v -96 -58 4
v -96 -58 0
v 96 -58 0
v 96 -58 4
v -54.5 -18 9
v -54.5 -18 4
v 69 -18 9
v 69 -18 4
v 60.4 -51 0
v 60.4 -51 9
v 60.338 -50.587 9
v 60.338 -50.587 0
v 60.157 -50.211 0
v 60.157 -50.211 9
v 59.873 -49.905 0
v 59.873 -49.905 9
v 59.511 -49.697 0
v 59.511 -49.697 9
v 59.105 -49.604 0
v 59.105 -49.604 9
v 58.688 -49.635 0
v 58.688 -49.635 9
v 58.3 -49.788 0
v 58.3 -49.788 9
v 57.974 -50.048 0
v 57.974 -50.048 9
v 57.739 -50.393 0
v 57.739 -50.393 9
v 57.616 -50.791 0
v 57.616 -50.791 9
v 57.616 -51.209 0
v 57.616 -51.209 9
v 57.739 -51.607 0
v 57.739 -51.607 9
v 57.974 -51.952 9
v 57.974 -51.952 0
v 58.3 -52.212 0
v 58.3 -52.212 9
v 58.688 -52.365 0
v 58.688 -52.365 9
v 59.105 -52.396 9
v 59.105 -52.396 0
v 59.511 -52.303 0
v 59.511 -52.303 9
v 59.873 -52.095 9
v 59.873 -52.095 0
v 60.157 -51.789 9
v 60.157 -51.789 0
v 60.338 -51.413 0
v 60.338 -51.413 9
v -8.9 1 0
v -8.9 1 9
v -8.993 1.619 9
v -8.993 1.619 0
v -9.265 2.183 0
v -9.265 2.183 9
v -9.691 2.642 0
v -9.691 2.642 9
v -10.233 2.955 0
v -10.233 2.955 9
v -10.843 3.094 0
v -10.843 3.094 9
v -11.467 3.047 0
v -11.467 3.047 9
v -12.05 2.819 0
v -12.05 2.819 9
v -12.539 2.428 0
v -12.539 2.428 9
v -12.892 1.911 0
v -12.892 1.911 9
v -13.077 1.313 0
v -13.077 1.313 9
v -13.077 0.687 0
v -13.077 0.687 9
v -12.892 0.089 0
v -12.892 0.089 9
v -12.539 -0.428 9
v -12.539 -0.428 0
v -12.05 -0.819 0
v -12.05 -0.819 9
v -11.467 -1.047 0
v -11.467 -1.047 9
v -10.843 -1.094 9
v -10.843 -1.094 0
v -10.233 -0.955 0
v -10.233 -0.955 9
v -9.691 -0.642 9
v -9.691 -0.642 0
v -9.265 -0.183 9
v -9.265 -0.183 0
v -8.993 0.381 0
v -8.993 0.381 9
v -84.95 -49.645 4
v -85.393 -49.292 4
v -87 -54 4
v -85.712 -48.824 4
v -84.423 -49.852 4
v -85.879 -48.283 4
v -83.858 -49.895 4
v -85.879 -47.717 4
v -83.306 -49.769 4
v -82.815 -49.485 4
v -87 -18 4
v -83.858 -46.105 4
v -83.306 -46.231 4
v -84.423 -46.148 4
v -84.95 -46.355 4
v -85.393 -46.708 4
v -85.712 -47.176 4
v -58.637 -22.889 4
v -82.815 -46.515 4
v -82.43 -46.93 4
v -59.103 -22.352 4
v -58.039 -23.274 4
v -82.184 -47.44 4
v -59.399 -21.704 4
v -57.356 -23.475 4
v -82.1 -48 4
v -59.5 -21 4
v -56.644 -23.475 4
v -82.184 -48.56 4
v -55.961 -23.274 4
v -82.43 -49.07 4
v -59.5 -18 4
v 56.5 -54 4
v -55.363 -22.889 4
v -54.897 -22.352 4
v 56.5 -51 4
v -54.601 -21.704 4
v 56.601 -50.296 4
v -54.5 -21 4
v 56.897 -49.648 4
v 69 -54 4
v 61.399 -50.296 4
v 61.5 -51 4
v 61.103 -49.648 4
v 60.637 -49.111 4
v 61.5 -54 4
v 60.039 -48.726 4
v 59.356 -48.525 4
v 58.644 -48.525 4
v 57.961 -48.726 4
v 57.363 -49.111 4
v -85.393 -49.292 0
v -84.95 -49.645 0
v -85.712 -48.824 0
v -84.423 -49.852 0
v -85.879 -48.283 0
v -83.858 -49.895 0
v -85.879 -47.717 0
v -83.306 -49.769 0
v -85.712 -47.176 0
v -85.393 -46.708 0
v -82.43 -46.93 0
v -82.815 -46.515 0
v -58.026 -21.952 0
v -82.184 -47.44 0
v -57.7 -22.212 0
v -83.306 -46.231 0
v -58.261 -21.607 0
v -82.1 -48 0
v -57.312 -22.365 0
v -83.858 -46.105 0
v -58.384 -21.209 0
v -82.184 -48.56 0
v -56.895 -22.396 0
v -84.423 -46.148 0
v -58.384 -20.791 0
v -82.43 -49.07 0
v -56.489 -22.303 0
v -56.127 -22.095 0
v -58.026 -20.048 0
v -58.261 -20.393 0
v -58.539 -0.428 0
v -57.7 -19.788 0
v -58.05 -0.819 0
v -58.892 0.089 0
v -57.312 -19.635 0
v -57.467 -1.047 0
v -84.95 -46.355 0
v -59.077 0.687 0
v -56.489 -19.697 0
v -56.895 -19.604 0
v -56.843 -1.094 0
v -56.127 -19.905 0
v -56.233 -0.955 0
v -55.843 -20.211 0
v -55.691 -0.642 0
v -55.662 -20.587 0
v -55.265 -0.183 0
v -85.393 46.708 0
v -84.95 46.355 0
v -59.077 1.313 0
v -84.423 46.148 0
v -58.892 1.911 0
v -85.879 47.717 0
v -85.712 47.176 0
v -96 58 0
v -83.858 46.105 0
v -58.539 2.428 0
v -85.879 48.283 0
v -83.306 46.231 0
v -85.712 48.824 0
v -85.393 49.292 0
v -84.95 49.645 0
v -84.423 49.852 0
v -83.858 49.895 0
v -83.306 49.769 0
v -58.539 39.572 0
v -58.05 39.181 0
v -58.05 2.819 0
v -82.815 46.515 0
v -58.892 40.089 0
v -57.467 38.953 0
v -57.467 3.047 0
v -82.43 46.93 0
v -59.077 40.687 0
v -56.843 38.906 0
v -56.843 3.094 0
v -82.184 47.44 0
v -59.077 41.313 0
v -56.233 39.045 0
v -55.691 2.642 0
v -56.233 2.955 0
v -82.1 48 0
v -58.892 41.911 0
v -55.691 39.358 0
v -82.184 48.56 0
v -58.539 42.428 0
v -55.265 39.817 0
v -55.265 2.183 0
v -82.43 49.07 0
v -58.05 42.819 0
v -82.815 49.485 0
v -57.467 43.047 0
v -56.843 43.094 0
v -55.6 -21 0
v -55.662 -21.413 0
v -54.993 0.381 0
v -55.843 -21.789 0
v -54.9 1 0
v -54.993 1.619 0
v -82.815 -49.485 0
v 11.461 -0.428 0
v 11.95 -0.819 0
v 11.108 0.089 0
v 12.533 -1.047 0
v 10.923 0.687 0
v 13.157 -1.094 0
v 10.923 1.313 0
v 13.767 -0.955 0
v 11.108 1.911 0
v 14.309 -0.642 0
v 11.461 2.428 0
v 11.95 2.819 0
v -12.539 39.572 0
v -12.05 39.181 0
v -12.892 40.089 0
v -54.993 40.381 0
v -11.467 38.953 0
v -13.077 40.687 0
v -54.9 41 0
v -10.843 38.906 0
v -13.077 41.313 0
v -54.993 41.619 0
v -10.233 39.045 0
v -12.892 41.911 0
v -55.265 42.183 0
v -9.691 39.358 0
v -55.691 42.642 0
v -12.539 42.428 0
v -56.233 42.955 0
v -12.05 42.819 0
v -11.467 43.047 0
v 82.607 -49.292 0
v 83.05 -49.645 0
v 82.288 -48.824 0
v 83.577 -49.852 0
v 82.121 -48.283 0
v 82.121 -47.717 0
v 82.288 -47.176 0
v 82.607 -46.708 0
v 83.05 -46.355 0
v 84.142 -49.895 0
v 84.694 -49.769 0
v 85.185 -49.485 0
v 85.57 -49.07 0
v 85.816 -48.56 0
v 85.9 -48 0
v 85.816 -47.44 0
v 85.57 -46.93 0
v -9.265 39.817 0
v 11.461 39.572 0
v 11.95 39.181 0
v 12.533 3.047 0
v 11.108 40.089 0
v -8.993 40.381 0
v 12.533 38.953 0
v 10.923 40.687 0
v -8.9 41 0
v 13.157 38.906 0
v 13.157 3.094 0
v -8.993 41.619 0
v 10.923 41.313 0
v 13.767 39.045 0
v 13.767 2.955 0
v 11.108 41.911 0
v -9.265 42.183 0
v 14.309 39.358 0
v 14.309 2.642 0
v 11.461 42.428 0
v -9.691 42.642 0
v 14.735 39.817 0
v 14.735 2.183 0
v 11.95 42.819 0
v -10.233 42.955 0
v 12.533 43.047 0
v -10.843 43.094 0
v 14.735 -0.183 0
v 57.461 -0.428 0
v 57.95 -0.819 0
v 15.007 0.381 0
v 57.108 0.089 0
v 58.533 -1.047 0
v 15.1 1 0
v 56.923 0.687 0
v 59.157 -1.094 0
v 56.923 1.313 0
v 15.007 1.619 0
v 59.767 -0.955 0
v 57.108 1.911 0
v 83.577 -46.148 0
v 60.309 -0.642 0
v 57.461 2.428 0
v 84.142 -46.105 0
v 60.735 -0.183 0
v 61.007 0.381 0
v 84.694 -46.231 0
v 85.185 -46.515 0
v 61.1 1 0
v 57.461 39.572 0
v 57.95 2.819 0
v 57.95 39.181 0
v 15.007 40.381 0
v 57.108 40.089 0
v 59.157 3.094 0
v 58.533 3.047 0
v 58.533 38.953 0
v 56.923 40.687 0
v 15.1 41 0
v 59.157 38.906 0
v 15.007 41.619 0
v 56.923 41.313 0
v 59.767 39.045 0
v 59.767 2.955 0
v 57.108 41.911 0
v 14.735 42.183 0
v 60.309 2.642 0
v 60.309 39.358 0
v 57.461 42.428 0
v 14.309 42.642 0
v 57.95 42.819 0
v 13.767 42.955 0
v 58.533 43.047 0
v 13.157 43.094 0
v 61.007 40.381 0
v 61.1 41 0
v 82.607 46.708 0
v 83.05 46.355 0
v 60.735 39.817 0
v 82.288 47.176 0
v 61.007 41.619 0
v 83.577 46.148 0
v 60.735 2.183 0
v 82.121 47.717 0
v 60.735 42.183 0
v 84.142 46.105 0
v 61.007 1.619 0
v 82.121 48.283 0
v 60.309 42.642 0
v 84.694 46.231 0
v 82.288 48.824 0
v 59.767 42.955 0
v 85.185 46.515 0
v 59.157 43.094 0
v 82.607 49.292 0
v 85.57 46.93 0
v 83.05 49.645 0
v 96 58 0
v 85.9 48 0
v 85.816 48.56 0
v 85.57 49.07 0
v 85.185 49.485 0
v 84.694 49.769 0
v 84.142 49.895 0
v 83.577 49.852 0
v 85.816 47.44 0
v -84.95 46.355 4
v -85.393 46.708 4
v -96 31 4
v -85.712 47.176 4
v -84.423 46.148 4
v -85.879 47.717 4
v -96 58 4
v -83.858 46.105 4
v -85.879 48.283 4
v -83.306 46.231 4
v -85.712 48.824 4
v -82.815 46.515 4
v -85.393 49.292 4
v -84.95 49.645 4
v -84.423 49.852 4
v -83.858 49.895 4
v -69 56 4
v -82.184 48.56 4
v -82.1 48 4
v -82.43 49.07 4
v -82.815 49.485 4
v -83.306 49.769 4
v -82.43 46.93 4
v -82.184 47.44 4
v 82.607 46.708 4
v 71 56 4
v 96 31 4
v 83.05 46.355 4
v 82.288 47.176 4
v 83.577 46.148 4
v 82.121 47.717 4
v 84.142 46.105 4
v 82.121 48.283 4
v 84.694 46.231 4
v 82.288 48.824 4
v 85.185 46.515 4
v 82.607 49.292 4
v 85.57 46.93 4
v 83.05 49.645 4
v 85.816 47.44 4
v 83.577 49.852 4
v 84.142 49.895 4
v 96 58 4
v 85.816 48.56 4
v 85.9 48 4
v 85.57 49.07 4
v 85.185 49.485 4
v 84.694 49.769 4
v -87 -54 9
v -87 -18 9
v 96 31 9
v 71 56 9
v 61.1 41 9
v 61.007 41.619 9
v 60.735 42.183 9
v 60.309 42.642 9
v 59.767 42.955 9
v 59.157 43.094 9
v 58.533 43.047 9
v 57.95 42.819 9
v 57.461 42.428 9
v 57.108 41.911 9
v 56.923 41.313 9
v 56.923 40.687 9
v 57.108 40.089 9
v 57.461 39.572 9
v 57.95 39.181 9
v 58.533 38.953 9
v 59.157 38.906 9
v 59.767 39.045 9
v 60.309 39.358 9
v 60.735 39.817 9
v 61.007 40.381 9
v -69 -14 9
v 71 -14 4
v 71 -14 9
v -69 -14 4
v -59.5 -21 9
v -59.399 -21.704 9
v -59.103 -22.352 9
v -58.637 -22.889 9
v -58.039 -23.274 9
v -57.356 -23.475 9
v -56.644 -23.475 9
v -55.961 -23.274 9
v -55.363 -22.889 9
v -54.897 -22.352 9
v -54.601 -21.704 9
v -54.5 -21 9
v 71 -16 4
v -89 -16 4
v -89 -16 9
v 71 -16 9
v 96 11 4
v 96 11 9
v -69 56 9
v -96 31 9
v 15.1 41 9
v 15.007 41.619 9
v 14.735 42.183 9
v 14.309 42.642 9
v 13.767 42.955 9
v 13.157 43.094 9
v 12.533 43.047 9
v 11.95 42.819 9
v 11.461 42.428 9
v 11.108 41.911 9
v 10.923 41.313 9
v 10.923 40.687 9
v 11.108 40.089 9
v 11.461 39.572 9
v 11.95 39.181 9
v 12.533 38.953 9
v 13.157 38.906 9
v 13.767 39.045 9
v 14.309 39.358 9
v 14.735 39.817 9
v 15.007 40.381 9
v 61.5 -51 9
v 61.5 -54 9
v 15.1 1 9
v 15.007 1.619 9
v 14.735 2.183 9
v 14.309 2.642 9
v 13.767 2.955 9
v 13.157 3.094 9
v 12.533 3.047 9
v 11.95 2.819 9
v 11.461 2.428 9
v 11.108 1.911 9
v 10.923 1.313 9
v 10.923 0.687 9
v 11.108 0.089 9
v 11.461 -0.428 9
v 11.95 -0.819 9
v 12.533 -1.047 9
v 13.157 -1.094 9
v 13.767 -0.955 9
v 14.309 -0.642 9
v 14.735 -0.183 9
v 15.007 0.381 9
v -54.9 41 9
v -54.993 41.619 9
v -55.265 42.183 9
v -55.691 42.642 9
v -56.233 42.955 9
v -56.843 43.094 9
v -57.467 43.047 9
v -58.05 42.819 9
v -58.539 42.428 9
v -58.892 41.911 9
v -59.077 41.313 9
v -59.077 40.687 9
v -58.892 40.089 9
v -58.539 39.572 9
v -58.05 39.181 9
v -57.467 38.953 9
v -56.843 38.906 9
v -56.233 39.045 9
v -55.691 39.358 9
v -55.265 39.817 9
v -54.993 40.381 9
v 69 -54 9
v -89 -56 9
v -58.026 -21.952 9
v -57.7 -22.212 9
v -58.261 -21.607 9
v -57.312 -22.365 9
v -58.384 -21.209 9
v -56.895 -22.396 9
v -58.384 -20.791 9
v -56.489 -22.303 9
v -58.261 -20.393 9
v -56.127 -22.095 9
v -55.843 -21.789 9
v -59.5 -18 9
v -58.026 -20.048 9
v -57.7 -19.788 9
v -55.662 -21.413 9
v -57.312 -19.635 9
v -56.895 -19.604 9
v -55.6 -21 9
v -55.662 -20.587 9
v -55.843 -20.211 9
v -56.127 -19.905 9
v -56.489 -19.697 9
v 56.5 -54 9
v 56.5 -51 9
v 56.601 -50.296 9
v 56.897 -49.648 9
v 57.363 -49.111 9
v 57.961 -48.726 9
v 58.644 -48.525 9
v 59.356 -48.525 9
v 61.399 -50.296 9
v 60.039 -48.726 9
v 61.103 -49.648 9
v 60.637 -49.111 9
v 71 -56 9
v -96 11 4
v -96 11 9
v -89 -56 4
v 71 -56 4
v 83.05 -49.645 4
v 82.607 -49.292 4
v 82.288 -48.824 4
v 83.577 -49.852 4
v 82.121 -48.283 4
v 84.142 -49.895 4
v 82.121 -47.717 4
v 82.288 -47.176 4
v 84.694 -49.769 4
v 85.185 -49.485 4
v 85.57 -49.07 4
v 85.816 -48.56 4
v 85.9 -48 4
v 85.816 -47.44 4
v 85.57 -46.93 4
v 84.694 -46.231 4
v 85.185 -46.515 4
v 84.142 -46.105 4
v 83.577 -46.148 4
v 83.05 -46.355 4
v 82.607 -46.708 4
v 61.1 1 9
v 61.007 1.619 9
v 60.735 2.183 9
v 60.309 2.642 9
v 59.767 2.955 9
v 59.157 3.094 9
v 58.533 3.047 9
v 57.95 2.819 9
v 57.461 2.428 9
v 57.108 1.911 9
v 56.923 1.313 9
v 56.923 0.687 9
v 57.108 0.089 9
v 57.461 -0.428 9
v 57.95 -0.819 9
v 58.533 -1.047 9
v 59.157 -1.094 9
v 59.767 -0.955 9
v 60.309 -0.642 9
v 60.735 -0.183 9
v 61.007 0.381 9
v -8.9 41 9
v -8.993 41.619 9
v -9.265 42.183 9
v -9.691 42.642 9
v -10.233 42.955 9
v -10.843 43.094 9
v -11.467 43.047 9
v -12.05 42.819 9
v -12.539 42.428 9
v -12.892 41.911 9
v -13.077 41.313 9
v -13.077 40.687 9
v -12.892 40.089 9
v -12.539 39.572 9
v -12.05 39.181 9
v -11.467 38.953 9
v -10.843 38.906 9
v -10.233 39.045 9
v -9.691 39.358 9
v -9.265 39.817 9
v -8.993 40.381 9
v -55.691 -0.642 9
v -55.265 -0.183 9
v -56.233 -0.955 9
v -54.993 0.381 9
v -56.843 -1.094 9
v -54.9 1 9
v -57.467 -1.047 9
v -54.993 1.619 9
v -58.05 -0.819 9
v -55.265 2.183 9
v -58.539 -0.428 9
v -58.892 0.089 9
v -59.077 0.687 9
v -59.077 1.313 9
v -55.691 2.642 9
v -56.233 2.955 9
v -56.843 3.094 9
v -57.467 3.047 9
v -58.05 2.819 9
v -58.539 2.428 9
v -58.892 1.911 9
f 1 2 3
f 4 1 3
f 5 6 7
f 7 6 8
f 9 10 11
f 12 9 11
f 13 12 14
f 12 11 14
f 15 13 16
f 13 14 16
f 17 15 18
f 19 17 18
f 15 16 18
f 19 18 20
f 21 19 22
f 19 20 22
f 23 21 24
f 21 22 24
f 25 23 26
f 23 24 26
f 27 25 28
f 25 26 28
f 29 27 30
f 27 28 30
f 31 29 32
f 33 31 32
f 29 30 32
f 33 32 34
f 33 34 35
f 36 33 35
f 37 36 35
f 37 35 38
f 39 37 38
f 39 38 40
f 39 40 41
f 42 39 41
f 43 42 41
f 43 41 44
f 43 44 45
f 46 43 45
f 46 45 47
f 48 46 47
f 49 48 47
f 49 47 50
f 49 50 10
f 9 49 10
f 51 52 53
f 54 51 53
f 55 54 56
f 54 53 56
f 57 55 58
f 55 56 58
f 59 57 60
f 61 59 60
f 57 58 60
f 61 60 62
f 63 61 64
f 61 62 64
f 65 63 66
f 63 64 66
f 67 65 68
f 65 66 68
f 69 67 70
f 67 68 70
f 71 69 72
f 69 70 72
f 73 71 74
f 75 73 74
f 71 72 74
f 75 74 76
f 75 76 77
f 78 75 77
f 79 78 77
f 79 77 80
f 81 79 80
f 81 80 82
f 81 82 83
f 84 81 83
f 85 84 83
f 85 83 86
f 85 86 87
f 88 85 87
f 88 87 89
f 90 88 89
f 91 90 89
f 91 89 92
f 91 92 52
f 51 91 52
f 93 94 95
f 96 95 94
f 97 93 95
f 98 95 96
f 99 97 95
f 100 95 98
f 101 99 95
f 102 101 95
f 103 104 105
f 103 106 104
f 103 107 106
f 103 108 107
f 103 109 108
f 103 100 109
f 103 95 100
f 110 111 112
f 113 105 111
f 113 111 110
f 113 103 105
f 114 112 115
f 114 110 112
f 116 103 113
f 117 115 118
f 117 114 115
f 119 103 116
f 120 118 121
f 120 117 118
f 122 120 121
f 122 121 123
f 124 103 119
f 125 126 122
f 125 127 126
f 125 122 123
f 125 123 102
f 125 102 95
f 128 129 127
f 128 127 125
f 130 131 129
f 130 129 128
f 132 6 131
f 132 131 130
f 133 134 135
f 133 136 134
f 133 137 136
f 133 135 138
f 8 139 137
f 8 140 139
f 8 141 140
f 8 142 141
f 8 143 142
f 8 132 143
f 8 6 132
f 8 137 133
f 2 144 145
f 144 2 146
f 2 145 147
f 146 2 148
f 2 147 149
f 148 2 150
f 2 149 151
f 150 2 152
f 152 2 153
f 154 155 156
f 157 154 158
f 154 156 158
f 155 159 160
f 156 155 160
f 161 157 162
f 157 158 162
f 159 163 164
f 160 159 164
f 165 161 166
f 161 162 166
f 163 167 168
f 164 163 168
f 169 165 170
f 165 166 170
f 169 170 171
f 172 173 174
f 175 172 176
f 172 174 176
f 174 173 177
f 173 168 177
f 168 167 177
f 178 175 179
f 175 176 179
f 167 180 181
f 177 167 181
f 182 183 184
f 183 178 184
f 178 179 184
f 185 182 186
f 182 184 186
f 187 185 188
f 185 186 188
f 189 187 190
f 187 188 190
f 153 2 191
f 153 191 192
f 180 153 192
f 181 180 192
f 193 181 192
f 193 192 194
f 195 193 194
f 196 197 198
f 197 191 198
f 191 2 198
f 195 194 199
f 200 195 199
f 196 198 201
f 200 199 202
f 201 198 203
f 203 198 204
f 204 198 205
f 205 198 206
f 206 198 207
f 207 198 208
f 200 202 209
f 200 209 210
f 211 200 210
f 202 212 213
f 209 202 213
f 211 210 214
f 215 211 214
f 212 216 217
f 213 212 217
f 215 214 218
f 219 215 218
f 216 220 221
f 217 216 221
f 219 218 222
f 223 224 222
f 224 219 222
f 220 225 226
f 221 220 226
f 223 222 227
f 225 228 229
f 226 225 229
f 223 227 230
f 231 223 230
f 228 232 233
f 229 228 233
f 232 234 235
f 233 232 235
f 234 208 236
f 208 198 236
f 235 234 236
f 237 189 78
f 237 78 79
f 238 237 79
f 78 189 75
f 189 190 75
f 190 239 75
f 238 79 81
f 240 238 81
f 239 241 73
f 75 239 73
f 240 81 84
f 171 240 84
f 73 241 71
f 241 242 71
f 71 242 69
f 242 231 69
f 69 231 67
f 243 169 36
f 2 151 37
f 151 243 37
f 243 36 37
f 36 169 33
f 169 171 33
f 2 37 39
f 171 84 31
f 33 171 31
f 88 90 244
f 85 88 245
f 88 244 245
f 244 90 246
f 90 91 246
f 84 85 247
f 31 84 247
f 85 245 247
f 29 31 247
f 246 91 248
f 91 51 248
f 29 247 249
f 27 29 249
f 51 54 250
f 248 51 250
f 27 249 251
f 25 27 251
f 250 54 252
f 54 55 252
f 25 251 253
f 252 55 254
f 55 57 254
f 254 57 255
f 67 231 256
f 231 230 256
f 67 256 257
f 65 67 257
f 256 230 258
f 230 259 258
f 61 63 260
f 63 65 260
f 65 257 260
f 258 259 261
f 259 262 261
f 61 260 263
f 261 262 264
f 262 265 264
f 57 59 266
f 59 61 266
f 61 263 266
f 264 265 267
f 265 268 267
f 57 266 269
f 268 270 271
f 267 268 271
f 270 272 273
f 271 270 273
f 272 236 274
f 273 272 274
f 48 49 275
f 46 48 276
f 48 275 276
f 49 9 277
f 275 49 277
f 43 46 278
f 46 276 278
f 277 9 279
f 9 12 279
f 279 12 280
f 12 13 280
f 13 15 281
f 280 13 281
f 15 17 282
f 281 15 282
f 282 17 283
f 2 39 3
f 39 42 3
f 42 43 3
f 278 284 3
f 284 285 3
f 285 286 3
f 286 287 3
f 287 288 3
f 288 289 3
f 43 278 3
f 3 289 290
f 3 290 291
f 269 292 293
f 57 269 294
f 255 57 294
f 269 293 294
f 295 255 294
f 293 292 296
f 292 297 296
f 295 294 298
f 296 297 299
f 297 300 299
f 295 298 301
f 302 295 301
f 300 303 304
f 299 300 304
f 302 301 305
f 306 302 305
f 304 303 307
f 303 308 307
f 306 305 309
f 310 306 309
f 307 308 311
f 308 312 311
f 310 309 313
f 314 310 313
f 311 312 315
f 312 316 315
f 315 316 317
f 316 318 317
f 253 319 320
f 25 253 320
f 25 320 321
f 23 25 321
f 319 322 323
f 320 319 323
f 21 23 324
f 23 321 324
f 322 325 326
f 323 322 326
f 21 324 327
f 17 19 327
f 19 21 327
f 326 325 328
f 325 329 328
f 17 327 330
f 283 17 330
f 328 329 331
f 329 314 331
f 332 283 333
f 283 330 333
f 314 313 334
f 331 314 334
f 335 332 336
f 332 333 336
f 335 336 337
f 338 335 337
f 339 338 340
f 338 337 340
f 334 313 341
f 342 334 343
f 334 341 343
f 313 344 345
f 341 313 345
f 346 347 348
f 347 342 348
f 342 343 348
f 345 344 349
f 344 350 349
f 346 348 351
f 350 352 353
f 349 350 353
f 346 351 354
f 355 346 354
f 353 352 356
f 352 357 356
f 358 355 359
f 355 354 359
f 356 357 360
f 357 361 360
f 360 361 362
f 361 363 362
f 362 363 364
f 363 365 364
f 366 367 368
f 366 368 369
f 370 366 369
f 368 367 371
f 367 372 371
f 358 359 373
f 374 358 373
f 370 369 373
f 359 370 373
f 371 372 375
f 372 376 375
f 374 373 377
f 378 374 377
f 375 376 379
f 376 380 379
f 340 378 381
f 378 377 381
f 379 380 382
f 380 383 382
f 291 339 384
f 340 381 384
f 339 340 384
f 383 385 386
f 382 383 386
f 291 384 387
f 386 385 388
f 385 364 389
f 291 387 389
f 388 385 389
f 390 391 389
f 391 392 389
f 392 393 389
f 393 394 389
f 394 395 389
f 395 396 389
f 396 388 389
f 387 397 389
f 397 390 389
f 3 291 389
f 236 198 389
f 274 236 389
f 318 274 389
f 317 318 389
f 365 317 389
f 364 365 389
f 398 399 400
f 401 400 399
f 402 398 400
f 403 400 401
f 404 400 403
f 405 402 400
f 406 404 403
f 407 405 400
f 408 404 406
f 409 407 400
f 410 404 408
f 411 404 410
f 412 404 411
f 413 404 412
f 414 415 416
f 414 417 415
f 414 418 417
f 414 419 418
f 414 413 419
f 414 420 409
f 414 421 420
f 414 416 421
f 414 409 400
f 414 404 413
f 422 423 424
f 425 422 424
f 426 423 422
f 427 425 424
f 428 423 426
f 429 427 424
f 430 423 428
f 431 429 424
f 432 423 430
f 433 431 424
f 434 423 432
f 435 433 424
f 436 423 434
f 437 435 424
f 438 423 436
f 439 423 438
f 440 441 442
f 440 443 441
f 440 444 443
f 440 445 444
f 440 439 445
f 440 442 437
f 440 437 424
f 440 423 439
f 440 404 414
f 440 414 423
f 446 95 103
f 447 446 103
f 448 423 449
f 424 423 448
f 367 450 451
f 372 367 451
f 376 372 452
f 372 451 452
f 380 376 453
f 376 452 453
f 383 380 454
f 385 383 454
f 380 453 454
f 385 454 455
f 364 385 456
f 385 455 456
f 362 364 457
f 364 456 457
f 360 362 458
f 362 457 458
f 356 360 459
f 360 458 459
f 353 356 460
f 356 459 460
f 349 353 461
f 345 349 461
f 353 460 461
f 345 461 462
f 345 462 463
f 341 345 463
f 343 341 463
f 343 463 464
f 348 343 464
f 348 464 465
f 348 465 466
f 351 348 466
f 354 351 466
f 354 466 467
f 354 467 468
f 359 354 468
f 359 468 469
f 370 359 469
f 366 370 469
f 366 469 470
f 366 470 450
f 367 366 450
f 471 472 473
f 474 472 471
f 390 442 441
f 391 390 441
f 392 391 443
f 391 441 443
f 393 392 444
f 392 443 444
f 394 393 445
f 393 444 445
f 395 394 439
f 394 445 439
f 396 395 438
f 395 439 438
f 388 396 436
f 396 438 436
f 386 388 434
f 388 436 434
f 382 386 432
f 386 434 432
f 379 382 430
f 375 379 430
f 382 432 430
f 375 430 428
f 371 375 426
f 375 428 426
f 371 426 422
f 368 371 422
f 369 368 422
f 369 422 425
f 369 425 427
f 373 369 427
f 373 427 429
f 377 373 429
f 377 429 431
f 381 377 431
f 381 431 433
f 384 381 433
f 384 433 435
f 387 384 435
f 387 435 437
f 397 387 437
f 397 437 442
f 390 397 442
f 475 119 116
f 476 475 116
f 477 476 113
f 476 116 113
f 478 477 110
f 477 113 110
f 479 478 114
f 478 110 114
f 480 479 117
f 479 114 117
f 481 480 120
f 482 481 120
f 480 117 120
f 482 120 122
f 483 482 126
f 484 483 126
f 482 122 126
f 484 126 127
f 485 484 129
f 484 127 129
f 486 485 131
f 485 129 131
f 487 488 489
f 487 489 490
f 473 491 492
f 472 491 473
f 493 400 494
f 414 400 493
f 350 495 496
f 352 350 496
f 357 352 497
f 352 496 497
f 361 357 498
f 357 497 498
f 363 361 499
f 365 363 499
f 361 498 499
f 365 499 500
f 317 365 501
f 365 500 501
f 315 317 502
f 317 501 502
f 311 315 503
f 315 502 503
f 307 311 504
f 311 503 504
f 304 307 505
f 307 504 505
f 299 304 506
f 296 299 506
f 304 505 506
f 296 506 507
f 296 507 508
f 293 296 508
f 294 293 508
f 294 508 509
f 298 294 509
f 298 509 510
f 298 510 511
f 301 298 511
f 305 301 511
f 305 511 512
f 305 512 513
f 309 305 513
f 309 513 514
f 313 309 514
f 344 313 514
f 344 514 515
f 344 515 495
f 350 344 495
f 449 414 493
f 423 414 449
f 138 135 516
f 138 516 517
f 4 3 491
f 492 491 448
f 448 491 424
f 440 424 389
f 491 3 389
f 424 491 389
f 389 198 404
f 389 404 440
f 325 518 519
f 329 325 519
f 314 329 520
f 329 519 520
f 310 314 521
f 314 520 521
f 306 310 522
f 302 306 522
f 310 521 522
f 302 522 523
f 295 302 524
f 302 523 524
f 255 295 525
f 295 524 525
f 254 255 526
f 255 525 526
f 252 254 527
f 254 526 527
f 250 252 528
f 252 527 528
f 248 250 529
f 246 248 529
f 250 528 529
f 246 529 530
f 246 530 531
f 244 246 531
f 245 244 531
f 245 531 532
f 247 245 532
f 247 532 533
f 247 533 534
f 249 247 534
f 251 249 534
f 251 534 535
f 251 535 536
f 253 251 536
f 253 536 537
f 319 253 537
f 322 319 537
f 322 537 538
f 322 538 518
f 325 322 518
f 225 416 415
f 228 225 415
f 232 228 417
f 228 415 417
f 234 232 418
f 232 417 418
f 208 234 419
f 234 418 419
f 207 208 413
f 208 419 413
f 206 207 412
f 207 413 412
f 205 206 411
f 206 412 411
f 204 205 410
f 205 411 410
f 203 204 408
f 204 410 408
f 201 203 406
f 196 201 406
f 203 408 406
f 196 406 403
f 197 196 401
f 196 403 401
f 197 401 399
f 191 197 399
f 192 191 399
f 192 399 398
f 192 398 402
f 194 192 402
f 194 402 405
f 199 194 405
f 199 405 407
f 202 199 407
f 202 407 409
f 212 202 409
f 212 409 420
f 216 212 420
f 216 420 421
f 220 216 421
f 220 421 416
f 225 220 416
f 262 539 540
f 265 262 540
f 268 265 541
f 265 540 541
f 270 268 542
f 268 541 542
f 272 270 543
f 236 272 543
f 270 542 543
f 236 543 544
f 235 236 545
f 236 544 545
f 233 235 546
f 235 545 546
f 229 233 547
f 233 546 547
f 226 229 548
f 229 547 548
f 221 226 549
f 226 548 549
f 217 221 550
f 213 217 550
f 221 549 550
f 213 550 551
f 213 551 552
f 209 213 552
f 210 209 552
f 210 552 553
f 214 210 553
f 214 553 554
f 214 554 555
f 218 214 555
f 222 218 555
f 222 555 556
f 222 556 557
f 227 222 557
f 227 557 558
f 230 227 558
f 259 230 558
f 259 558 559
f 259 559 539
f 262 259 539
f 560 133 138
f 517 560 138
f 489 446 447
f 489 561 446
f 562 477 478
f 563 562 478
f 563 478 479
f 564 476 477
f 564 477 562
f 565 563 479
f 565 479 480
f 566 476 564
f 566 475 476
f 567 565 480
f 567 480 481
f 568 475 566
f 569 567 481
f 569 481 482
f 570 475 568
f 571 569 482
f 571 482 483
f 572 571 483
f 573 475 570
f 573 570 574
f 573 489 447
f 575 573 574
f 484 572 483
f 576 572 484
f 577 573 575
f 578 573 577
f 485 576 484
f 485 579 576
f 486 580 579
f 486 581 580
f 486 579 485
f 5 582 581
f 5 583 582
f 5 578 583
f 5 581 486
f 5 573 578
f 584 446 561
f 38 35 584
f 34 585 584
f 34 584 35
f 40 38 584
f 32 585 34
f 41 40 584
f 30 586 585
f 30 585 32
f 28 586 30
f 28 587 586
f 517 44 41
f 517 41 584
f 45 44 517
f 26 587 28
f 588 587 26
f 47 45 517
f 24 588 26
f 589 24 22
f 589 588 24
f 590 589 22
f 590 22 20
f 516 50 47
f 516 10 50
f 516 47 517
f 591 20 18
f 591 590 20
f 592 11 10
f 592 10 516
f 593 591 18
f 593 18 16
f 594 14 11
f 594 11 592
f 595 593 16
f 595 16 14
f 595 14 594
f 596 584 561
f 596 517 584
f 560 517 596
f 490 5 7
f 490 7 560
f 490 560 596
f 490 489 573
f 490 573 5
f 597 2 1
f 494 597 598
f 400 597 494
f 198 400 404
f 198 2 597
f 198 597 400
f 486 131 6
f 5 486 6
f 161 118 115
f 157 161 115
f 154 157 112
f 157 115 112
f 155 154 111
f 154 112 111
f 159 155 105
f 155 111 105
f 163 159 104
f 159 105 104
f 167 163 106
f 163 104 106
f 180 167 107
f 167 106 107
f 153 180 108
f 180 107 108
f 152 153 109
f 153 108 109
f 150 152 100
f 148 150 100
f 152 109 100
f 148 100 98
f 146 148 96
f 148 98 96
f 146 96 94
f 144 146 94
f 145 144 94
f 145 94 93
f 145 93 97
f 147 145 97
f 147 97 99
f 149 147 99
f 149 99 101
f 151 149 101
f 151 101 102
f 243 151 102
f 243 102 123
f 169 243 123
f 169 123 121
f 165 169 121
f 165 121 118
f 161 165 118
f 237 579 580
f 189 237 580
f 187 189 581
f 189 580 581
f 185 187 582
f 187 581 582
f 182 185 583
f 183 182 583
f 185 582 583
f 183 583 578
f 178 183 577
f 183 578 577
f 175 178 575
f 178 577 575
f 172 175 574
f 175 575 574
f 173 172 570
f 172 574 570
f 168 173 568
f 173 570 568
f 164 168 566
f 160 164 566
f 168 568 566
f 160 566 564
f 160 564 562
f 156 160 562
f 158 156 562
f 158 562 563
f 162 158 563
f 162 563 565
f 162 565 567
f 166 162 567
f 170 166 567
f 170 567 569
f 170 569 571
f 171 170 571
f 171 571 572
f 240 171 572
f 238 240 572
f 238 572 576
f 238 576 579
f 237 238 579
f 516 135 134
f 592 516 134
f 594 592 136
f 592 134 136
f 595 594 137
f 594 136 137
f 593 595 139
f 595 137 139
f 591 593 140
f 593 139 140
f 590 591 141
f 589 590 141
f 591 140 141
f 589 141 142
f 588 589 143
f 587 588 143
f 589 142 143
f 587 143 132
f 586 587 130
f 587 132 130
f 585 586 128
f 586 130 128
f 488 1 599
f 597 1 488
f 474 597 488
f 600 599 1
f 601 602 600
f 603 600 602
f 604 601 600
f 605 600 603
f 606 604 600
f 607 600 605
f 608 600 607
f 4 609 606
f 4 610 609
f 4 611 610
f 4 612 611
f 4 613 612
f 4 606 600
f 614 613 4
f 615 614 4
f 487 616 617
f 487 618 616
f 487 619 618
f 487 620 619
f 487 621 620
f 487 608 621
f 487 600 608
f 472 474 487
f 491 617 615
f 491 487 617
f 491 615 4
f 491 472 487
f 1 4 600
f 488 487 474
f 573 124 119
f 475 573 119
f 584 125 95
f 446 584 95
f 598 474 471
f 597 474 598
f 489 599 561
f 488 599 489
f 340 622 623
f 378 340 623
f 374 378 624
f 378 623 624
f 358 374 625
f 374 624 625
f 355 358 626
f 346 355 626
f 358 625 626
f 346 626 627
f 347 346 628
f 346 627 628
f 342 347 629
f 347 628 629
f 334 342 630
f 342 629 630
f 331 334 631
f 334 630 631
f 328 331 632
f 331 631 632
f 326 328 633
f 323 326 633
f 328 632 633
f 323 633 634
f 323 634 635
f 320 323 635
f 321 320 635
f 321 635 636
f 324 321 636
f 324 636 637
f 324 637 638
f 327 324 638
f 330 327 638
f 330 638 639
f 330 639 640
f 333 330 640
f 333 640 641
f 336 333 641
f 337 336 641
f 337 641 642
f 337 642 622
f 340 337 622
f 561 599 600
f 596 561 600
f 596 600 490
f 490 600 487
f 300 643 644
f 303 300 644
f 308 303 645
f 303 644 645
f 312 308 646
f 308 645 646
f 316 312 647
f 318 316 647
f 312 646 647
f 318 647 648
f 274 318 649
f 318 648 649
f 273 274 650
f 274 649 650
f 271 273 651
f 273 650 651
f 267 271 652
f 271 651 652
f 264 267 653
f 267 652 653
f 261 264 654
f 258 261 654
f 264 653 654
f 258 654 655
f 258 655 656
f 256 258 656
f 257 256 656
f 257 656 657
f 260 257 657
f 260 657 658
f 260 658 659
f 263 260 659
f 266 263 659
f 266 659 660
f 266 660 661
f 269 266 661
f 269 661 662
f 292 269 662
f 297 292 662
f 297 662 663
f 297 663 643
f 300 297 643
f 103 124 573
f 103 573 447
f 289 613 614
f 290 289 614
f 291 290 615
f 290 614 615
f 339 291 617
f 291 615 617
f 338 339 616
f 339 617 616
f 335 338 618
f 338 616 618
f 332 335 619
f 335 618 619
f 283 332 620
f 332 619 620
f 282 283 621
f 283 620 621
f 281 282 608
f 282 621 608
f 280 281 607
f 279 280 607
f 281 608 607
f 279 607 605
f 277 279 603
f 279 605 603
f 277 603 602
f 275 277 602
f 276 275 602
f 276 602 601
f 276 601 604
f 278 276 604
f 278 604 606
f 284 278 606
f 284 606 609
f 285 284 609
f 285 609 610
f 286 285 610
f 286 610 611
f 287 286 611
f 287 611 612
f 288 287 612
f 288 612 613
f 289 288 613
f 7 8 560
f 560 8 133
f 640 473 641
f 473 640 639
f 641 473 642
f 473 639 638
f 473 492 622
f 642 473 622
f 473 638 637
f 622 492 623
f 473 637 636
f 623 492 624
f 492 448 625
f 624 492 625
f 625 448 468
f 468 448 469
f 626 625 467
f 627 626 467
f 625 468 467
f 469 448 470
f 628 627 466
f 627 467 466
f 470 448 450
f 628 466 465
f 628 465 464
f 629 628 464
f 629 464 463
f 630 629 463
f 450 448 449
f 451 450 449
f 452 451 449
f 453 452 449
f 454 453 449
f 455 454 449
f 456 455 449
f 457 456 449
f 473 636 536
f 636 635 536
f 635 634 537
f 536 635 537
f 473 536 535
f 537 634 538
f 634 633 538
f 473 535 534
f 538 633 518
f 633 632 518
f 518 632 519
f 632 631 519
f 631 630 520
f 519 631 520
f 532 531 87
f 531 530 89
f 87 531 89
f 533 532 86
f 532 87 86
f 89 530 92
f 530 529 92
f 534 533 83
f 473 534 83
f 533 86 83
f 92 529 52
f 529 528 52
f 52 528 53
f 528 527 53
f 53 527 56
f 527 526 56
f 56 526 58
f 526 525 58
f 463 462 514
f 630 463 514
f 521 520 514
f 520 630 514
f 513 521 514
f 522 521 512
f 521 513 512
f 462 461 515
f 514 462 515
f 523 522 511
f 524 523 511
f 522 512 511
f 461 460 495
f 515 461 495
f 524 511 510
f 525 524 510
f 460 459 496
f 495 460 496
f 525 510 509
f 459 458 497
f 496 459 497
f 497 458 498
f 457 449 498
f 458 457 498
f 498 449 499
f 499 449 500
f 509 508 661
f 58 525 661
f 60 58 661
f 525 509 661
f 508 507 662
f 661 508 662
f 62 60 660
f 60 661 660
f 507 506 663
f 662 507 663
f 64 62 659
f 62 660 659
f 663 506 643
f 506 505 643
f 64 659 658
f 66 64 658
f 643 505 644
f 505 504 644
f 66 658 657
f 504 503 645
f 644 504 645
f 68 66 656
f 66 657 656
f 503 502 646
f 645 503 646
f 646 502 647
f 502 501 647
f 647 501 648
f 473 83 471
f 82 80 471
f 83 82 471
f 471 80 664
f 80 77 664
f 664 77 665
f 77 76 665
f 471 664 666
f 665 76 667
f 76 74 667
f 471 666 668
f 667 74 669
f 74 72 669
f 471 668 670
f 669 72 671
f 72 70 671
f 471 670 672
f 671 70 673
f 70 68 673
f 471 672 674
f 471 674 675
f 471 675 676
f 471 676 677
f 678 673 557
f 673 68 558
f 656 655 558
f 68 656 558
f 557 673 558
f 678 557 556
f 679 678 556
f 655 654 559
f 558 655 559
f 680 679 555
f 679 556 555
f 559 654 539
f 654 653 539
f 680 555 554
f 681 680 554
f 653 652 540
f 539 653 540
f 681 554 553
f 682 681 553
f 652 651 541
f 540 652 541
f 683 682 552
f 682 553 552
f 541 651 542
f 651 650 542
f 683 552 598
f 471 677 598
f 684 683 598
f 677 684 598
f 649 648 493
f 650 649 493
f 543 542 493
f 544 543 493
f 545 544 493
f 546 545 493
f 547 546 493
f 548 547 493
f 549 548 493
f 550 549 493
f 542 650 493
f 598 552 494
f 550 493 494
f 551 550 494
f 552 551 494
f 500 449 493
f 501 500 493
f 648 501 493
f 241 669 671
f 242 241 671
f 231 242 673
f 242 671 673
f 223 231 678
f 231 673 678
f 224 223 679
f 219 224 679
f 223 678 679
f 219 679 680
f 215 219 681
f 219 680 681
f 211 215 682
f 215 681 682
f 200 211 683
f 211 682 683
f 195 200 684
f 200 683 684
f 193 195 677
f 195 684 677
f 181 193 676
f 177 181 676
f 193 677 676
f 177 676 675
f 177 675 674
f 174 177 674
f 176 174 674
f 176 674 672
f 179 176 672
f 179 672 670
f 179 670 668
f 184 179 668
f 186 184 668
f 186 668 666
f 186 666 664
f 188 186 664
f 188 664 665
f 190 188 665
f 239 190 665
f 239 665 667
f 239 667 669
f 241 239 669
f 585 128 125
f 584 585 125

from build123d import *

# Parameters (mm, degrees)
SKETCH_W        = 192
SKETCH_H        = 116
PAD_DEPTH       = 4
SKETCH001_W     = 160
SKETCH001_H     = 40
PAD001_DEPTH    = 5
SKETCH002_R     = 1.4
POCKET_DEPTH    = 9.001
PAD002_DEPTH    = 5
SKETCH004_R     = 1.9
SKETCH004_R_2   = 2.1
POCKET001_DEPTH = 9.001


with BuildPart() as part:
    # Sketch → Pad (new body)
    with BuildSketch(Plane.XY):
        Rectangle(SKETCH_W, SKETCH_H)
    extrude(amount=PAD_DEPTH)

    # Sketch001 (on Face6 of Pad) → Pad001 (join)
    with BuildSketch(Plane.XY.offset(4)):
        with Locations((-9, -36)):
            Rectangle(SKETCH001_W, SKETCH001_H)
        with BuildLine():
            Line((69, -18), (69, -54))
            Line((69, -54), (61.5, -54))
            Line((61.5, -51), (61.5, -54))
            ThreePointArc((61.5, -51), (59, -48.5), (56.5, -51))
            Line((56.5, -51), (56.5, -54))
            Line((56.5, -54), (-87, -54))
            Line((-87, -54), (-87, -18))
            Line((-59.5, -18), (-87, -18))
            Line((-59.5, -18), (-59.5, -21))
            ThreePointArc((-59.5, -21), (-57, -23.5), (-54.5, -21))
            Line((-54.5, -21), (-54.5, -18))
            Line((-54.5, -18), (69, -18))
        make_face(mode=Mode.SUBTRACT)
    extrude(amount=PAD001_DEPTH)

    # Sketch002 (on Face11 of Pad001) → Pocket (cut, through all)
    with BuildSketch(Plane.XY.offset(9)):
        with Locations((-57, -21)):
            Circle(SKETCH002_R)
        with Locations((59, -51)):
            Circle(SKETCH002_R)
    extrude(amount=-POCKET_DEPTH, mode=Mode.SUBTRACT)

    # Sketch003 (on Face5 of Pocket) → Pad002 (join)
    with BuildSketch(Plane.XY.offset(4)):
        Polygon((-69, 56), (71, 56), (96, 31), (96, 11), (71, -14), (-69, -14), (-96, 11), (-96, 31), align=None)
    extrude(amount=PAD002_DEPTH)

    # Sketch004 (on Face22 of Pad002) → Pocket001 (cut, through all)
    with BuildSketch(Plane.XY.offset(9)):
        with Locations((-84, 48)):
            Circle(SKETCH004_R)
        with Locations((-84, -48)):
            Circle(SKETCH004_R)
        with Locations((84, -48)):
            Circle(SKETCH004_R)
        with Locations((84, 48)):
            Circle(SKETCH004_R)
        with Locations((-57, 41)):
            Circle(SKETCH004_R_2)
        with Locations((-11, 41)):
            Circle(SKETCH004_R_2)
        with Locations((-57, 1)):
            Circle(SKETCH004_R_2)
        with Locations((-11, 1)):
            Circle(SKETCH004_R_2)
        with Locations((13, 41)):
            Circle(SKETCH004_R_2)
        with Locations((59, 41)):
            Circle(SKETCH004_R_2)
        with Locations((59, 1)):
            Circle(SKETCH004_R_2)
        with Locations((13, 1)):
            Circle(SKETCH004_R_2)
    extrude(amount=-POCKET001_DEPTH, mode=Mode.SUBTRACT)


solid = part.part
